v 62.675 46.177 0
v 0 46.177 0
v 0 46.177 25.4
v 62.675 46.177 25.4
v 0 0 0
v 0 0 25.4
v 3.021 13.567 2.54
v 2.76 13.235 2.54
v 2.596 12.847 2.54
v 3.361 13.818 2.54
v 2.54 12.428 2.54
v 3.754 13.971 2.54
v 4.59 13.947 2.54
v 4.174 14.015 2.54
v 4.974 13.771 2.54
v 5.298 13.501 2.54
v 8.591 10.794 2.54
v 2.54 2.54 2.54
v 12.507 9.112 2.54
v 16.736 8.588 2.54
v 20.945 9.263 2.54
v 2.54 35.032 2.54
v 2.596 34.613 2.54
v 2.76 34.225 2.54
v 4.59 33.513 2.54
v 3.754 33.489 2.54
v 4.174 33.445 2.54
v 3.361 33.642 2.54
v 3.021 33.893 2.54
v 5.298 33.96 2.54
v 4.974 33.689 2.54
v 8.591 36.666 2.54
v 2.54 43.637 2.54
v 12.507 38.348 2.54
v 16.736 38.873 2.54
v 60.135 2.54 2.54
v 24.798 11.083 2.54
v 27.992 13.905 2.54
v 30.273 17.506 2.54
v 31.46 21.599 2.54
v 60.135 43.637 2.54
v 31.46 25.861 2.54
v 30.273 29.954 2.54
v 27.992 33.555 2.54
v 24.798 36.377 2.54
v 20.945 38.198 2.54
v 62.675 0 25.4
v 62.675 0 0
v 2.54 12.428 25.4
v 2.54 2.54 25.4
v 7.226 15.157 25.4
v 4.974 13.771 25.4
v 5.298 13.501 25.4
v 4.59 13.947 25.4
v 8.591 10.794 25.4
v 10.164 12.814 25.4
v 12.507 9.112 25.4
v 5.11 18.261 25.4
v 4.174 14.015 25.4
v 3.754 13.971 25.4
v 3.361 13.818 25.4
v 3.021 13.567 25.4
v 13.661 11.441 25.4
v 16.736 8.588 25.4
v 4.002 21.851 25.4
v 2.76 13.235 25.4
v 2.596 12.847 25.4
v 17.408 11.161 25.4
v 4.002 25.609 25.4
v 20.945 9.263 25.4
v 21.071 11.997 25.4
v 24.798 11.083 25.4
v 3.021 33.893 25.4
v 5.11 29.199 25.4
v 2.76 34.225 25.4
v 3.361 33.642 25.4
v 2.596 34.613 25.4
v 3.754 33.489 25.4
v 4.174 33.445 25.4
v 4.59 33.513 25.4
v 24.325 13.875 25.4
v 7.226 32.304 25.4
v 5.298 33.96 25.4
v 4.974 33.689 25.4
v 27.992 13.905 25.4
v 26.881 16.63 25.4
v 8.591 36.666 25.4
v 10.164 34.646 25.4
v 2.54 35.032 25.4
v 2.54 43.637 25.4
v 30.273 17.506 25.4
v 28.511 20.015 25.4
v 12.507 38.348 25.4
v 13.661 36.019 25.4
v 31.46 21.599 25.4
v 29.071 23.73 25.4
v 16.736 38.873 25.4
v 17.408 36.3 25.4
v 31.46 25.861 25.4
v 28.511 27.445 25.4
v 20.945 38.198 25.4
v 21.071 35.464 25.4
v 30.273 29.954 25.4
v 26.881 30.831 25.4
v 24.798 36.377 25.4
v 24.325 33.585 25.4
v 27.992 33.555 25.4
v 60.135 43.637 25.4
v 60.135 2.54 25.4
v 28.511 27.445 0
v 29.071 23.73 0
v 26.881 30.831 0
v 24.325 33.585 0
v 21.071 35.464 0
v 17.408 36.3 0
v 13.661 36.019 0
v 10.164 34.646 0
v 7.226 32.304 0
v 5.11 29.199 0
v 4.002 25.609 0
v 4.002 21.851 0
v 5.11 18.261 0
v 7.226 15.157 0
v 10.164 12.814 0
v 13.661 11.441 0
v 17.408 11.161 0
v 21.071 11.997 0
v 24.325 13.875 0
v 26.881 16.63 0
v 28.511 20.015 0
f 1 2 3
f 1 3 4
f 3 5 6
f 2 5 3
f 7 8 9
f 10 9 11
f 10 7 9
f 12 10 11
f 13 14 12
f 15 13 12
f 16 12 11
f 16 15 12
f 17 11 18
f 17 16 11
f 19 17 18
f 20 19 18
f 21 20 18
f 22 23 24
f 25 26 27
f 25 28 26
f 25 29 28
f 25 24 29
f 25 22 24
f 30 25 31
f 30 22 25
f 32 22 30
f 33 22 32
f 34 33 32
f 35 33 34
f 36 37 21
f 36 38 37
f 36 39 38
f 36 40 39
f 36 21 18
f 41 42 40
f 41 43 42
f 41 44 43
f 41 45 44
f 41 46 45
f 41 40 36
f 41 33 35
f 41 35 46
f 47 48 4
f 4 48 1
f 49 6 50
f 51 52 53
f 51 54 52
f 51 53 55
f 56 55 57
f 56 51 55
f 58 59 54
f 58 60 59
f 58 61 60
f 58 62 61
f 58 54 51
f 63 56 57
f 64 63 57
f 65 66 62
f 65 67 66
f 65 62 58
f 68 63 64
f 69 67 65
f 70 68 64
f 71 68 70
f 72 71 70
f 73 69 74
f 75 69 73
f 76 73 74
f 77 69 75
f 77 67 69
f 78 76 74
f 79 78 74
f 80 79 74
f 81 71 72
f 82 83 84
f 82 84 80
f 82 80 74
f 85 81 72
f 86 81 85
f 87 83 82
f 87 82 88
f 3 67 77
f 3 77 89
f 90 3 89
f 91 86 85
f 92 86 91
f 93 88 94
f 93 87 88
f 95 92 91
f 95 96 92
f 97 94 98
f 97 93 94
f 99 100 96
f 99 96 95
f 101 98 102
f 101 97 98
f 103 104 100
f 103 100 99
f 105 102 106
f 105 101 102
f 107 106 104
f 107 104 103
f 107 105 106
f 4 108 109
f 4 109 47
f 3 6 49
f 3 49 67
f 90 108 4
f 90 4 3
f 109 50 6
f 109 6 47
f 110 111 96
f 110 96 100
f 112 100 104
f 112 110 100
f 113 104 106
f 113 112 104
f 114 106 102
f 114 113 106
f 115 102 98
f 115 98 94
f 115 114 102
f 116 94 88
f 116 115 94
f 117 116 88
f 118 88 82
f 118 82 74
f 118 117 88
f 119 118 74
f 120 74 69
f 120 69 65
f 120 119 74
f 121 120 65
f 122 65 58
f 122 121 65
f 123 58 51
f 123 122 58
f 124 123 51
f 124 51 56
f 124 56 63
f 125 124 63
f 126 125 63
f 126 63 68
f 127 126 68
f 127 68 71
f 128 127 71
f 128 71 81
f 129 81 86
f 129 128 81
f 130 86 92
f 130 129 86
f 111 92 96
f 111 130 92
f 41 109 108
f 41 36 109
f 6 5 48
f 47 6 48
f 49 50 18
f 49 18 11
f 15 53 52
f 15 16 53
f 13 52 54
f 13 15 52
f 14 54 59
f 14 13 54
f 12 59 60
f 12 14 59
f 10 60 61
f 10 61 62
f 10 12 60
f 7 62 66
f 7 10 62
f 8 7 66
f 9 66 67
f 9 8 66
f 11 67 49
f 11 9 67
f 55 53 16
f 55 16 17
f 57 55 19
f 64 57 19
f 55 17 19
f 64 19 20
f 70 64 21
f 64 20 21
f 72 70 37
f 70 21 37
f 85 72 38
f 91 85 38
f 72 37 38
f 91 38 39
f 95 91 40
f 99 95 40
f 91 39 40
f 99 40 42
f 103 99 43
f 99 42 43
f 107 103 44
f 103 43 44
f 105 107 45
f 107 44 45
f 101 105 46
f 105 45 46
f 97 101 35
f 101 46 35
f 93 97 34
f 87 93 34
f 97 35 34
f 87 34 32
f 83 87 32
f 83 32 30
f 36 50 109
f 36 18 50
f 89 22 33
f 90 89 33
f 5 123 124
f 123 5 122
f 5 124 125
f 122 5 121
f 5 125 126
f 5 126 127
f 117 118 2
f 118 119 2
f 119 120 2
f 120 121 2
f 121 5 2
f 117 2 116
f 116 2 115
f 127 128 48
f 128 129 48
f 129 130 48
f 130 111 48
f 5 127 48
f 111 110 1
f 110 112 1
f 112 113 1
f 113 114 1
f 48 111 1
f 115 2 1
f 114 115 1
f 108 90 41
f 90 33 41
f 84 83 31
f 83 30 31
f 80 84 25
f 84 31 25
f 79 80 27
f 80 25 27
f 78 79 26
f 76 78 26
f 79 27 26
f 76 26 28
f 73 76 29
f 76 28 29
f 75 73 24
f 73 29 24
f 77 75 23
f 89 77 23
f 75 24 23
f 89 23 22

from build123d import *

# Parameters (mm, degrees)
F0_W     = 62.6746565104
F0_H     = 46.1766123772
F0_R     = 12.6048441678
F1_DEPTH = 25.4
F2_T     = -2.54
F3_R     = 1.5875


with BuildPart() as f1:
    # F0 (on Top) → F1 (new body)
    with BuildSketch(Plane.XY):
        with Locations((31.3373282552, 23.0883061886)):
            Rectangle(F0_W, F0_H)
        with Locations((16.4661593735, 23.7301085144)):
            Circle(F0_R, mode=Mode.SUBTRACT)
    extrude(amount=F1_DEPTH)

    # F2
    f2_openings = [f1.faces().sort_by_distance(p)[0] for p in [
        (34.436685, 22.954546, 25.4),
    ]]
    offset(amount=F2_T, openings=f2_openings)

    # F3
    f3_edges = [f1.edges().sort_by_distance(p)[0] for p in [
        (2.54, 29.682284, 13.97),
        (2.54, 17.777933, 13.97),
    ]]
    fillet(f3_edges, radius=F3_R)


solid = f1.part
